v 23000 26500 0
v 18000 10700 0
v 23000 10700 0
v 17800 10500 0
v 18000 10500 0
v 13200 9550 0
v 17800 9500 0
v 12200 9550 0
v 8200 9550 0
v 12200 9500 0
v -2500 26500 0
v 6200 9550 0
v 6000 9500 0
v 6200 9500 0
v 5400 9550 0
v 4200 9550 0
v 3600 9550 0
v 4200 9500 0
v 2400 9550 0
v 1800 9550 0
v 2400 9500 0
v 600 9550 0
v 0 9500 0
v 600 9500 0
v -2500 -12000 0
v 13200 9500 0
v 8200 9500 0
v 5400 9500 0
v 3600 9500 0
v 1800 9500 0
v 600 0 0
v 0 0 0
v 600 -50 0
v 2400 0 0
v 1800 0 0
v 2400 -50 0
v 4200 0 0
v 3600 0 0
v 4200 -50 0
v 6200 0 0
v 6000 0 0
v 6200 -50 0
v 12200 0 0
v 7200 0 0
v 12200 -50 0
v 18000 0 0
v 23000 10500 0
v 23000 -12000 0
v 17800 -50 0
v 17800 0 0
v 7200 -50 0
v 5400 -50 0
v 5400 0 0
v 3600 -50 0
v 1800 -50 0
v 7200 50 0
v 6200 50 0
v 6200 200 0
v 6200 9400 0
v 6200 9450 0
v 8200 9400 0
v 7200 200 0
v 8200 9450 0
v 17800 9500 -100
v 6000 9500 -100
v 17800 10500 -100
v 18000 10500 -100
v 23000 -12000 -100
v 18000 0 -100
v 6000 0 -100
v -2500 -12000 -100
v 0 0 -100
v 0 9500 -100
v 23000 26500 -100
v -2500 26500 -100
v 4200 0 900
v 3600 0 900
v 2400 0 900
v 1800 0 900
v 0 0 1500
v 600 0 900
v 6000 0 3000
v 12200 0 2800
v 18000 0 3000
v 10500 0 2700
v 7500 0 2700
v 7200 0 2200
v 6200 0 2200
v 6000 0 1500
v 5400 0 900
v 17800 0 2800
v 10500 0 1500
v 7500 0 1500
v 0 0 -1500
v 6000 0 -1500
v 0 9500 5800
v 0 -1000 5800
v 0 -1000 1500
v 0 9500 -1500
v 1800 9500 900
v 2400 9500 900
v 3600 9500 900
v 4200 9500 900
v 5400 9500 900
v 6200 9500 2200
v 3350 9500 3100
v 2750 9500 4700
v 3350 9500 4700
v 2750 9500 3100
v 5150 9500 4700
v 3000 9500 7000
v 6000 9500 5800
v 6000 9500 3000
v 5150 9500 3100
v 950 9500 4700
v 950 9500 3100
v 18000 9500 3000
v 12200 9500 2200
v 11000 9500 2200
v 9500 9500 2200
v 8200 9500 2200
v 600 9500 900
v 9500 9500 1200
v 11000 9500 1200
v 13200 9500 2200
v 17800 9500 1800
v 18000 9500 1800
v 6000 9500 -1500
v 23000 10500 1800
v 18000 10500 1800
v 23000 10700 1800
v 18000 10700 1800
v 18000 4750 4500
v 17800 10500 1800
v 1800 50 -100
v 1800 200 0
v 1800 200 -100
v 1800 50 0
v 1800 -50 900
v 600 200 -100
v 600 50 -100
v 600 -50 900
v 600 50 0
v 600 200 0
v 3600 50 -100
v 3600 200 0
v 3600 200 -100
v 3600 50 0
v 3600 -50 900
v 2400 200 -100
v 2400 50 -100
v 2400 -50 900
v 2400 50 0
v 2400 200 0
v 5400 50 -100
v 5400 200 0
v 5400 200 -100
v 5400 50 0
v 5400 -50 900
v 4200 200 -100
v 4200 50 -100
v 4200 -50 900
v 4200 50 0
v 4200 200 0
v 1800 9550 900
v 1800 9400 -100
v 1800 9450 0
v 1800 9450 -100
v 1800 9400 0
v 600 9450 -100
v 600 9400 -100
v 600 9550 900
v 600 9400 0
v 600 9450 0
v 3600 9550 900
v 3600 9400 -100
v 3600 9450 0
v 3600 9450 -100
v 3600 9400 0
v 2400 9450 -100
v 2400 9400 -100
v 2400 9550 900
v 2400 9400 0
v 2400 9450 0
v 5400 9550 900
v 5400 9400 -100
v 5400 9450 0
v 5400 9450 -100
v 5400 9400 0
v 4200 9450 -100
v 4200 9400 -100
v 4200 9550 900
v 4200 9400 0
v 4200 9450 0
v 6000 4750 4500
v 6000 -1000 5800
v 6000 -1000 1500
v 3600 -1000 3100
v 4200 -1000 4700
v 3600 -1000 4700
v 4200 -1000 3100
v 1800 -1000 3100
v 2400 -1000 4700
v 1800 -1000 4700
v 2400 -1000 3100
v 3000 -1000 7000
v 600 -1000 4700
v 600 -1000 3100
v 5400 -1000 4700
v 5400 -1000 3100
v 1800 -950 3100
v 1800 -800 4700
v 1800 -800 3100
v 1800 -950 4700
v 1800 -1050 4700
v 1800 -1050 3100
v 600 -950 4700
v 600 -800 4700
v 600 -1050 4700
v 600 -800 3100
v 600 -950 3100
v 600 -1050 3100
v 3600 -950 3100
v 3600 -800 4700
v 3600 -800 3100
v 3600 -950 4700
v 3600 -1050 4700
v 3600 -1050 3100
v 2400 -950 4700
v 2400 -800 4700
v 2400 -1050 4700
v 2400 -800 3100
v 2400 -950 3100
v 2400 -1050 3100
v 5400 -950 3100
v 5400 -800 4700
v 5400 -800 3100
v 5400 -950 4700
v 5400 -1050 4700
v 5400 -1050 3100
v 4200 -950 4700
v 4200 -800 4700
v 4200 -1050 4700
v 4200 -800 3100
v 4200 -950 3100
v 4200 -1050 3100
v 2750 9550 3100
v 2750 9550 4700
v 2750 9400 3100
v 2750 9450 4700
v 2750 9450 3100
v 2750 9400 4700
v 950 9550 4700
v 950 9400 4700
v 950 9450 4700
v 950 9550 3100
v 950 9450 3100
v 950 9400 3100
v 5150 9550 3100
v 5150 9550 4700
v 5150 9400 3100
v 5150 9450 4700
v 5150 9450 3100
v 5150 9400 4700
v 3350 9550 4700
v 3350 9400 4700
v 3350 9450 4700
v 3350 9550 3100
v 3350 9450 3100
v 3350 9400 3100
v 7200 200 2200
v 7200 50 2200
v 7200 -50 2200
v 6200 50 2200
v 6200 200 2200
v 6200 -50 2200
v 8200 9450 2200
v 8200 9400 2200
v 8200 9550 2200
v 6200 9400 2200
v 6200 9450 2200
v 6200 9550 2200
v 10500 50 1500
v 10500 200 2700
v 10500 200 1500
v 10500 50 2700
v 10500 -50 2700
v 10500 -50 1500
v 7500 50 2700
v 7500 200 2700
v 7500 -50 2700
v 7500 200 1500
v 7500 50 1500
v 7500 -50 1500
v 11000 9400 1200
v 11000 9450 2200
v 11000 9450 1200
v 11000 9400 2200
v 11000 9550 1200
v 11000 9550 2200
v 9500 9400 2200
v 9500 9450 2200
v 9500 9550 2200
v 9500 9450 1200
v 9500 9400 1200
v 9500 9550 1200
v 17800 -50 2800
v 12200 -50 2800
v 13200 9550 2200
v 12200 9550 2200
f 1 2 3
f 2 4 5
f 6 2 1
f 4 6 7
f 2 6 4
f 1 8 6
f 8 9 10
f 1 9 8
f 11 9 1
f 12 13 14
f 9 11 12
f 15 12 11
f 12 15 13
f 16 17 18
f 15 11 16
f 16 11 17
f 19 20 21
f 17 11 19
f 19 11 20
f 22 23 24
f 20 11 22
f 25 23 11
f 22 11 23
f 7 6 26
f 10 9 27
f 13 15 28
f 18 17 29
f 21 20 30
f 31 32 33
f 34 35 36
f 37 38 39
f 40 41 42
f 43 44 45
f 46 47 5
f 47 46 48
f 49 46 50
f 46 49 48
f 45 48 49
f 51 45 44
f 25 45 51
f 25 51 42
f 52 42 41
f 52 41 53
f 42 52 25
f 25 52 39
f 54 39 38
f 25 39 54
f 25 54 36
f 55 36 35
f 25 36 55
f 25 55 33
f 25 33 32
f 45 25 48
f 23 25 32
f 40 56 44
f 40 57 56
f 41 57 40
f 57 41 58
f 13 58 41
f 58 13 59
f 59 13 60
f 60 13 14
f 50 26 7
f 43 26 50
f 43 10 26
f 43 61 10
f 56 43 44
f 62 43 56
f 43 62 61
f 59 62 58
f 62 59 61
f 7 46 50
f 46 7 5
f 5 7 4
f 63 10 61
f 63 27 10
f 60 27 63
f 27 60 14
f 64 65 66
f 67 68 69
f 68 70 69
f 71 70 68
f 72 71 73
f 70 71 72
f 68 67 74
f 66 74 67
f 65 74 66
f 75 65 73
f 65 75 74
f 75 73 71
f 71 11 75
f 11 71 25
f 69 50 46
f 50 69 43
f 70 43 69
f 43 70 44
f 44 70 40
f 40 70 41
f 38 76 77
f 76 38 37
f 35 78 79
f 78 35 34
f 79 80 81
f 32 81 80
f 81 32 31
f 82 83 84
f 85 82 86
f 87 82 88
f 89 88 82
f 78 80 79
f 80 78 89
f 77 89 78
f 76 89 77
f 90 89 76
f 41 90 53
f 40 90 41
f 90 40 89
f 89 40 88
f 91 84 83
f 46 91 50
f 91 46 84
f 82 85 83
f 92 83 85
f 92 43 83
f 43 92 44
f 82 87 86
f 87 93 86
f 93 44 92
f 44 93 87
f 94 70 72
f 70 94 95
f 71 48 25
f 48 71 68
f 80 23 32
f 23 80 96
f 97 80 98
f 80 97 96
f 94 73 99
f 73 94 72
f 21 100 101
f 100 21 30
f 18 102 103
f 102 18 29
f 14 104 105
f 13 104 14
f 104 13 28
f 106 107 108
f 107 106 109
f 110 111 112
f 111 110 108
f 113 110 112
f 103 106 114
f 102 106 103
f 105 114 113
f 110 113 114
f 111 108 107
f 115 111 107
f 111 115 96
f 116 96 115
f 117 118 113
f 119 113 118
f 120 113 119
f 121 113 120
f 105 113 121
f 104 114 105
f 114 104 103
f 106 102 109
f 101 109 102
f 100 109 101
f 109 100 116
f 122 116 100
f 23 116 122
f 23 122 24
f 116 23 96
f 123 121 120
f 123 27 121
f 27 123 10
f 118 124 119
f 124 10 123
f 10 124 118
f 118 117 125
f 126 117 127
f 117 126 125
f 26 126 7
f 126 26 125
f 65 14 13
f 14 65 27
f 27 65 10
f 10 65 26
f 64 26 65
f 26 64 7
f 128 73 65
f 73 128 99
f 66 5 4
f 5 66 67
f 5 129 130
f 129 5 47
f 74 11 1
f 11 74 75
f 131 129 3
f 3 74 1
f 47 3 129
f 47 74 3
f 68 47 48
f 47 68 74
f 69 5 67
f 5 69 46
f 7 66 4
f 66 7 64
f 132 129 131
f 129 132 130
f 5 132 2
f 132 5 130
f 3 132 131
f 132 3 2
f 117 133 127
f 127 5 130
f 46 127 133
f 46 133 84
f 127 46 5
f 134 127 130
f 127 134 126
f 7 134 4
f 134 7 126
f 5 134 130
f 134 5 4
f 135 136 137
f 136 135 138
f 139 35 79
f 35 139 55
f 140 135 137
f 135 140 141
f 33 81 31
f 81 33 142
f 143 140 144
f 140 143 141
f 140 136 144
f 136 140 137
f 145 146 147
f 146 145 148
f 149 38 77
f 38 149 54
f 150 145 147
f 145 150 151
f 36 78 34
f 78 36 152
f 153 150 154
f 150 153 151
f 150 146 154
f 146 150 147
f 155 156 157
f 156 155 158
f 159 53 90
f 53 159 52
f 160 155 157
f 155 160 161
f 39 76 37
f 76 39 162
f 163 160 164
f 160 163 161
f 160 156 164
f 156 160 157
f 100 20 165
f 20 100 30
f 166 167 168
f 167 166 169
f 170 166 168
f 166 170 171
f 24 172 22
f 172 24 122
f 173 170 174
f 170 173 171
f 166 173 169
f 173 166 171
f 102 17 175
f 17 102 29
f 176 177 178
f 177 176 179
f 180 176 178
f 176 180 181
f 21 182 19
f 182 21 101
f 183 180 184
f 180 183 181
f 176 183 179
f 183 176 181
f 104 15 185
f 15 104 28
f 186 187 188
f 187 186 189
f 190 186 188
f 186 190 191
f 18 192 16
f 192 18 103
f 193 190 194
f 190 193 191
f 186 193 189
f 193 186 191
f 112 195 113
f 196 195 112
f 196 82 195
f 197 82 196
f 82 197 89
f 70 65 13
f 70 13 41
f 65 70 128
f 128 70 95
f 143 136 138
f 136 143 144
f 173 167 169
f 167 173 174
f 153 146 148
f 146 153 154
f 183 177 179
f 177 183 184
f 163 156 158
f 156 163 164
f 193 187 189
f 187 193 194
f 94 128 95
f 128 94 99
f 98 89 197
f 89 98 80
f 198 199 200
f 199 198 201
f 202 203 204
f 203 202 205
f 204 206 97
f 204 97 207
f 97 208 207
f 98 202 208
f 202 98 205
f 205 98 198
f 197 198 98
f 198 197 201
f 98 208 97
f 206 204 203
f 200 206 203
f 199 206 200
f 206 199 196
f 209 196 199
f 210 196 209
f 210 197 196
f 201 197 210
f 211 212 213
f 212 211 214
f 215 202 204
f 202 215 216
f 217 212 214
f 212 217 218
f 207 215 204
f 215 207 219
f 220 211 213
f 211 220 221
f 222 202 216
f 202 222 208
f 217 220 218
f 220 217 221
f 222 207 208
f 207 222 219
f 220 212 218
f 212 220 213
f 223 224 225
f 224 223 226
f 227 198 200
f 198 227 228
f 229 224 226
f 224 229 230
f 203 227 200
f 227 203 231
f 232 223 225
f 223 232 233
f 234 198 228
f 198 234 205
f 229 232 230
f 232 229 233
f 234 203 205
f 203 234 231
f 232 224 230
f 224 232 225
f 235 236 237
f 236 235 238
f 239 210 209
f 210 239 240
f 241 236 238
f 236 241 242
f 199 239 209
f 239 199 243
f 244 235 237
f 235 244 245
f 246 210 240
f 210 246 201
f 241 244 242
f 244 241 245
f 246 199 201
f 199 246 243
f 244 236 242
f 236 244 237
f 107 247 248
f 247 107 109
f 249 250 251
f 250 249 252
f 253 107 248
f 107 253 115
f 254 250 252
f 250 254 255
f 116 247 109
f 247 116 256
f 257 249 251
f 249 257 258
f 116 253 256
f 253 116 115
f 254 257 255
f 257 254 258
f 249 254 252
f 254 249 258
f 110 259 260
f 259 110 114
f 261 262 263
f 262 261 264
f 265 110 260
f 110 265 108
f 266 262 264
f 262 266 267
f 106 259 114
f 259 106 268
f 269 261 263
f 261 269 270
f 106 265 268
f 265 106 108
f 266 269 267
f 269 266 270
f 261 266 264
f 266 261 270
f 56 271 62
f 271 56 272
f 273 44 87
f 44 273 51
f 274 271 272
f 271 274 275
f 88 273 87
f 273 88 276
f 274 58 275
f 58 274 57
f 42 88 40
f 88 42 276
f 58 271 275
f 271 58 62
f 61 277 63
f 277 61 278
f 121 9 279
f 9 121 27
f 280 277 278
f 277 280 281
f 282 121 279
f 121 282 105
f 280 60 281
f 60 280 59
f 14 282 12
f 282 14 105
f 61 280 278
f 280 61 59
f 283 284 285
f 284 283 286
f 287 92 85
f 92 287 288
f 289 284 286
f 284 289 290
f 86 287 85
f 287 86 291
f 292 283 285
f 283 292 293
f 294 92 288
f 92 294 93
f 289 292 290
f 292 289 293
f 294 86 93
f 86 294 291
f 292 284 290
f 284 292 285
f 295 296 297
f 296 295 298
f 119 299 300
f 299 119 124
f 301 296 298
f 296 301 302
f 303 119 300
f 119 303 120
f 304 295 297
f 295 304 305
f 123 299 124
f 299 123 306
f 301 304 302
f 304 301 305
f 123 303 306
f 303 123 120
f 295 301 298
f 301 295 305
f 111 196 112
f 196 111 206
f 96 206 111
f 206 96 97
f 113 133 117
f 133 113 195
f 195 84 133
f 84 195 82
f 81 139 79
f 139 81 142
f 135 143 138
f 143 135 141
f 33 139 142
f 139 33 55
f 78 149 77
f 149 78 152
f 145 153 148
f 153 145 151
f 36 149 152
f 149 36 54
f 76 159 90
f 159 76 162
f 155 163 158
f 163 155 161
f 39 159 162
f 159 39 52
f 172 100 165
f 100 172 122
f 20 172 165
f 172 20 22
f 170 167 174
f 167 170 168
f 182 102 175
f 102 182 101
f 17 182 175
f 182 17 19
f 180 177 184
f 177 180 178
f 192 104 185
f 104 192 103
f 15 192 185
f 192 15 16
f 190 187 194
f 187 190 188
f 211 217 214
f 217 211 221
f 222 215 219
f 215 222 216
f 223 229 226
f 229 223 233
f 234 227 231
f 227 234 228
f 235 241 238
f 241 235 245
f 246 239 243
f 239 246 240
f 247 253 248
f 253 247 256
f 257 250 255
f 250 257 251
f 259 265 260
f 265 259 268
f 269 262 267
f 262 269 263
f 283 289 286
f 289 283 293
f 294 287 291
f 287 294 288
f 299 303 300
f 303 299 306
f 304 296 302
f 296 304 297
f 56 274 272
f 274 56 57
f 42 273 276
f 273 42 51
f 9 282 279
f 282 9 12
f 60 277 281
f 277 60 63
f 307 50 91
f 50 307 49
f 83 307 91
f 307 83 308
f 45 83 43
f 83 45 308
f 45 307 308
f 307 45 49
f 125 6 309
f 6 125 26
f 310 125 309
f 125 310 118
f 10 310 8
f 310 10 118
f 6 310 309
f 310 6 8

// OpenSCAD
// file: utilities.scad
// utilities.scad - Reusable Utility Modules
include <config.scad>

// ========================================
// BASIC UTILITY MODULES
// ========================================

module create_window_opening(x, y, z, w, d, h) {
    translate([x, y, z])
    cube([w, d, h]);
}

module create_window_pane(x, y, z, w, d, h, color_override = window_color) {
    color(color_override)
    translate([x, y, z])
    cube([w, d, h]);
}

module create_door_opening(x, y, z, w, d, h) {
    translate([x, y, z])
    cube([w, d, h]);
}

module create_door_pane(x, y, z, w, d, h, color_override = door_color) {
    color(color_override)
    translate([x, y, z])
    cube([w, d, h]);
}
// file: doors.scad
// doors.scad - Door Modules
include <config.scad>
include <utilities.scad>

// ========================================
// DOOR OPENINGS
// ========================================
module all_door_openings() {
    // Front door opening
    create_door_opening(200, -100, 0, door_width, door_depth, door_height);
    
    // Sliding door opening (back - straight across from front door)
    create_door_opening(200, house_depth - 100, 0, sliding_door_width, door_depth, door_height);
    
    // Garage door opening (front) - relative to garage section
    translate([garage_section_x, 0, 0])
    translate([200, -100, 0])
    cube([5600, 300, house_height - 200]);
    
    // Garage back door opening (against kitchen wall)
    create_door_opening(garage_section_x + 200, house_depth - 100, 0, door_width, door_depth, door_height);
}

// ========================================
// DOOR PANES
// ========================================
module all_door_panes() {
    // Front door
    create_door_pane(200, -50, 0, door_width, door_pane_depth, door_height, door_color);
    
    // Sliding door (back - glass panels)
    create_door_pane(200, house_depth - 50, 0, sliding_door_width, door_pane_depth, door_height, window_color);
    
    // Garage door (front)
    color(garage_door_color)
    translate([garage_section_x + 200, -50, 0])
    cube([5600, door_pane_depth, house_height - 200]);
    
    // Garage back door (against kitchen wall)
    create_door_pane(garage_section_x + 200, house_depth - 50, 0, door_width, door_pane_depth, door_height, door_color);
}
// file: windows.scad
// windows.scad - Window Modules
include <config.scad>
include <utilities.scad>

// ========================================
// BASEMENT WINDOWS
// ========================================
module basement_windows() {
    // Front window openings
    for (x = basement_window_x_positions) {
        create_window_opening(x, -100, -100, window_width, window_depth, basement_window_height);
    }
    // Back window openings (straight across from front)
    for (x = basement_window_x_positions) {
        create_window_opening(x, house_depth - 100, -100, window_width, window_depth, basement_window_height);
    }
}

module basement_window_panes() {
    // Front window panes
    for (x = basement_window_x_positions) {
        create_window_pane(x, -50, -100, window_width, window_pane_depth, basement_window_height, window_color);
    }
    // Back window panes (straight across from front)
    for (x = basement_window_x_positions) {
        create_window_pane(x, house_depth - 50, -100, window_width, window_pane_depth, basement_window_height, window_color);
    }
}

// ========================================
// MASTER BEDROOM WINDOWS
// ========================================
module master_bedroom_window_openings() {
    // Front windows (master bedroom)
    for (x = master_bedroom_front_window_x_positions) {
        create_window_opening(x, -1100, house_height + 100, window_width, window_depth, master_bedroom_window_height);
    }
    // Back windows (bedrooms across the hall) - wider
    for (x = master_bedroom_back_window_x_positions) {
        create_window_opening(x, house_depth - 100, house_height + 100, back_bedroom_window_width, window_depth, master_bedroom_window_height);
    }
}

module master_bedroom_window_panes() {
    // Front windows (master bedroom)
    for (x = master_bedroom_front_window_x_positions) {
        create_window_pane(x, -1050, house_height + 100, window_width, window_pane_depth, master_bedroom_window_height, window_color);
    }
    // Back windows (bedrooms across the hall) - wider
    for (x = master_bedroom_back_window_x_positions) {
        create_window_pane(x, house_depth - 50, house_height + 100, back_bedroom_window_width, window_pane_depth, master_bedroom_window_height, window_color);
    }
}

// ========================================
// GROUND FLOOR WINDOWS
// ========================================
module ground_floor_window_openings() {
    // Living room window opening (front)
    create_window_opening(1500, -100, 1500, living_room_window_width, window_depth, living_room_window_height);
    
    // Kitchen window opening (back - moved 1m east)
    create_window_opening(3500, house_depth - 100, 1200, kitchen_window_width, window_depth, kitchen_window_height);
}

module ground_floor_window_panes() {
    // Living room window (front)
    create_window_pane(1500, -50, 1500, living_room_window_width, window_pane_depth, living_room_window_height, window_color);
    
    // Kitchen window (back - moved 1m east)
    create_window_pane(3500, house_depth - 50, 1200, kitchen_window_width, window_pane_depth, kitchen_window_height, window_color);
}
// file: fence.scad
// fence.scad - Wood Fence Module
include <config.scad>

// ========================================
// FENCE MODULE
// ========================================
module wood_fence(
    main_fence_x = 18000,
    main_fence_y = 10500, 
    main_fence_width = 5000,
    connector_fence_x = 17800,
    connector_fence_y = 9500,
    connector_fence_height = 1000,
    thickness = fence_thickness,
    height = fence_height,
    color_override = fence_color
) {
    color(color_override) {
        // Main fence across back of sidewalk
        translate([main_fence_x, main_fence_y, 0])
        cube([main_fence_width, thickness, height]);
        
        // Short fence connecting to house
        translate([connector_fence_x, connector_fence_y, 0])
        cube([thickness, connector_fence_height, height]);
    }
}
// file: landscaping.scad
// landscaping.scad - Landscaping Modules
include <config.scad>

// ========================================
// LAWN AREAS
// ========================================
module lawn_areas() {
    color(grass_color) {
        // Left side lawn (in front of left section) - extended to 12m from front door
        translate([-2500, -12000, -100])
        cube([8500, 12000, 100]);
        
        // Left side of house (along the side) - extended
        translate([-2500, 0, -100])
        cube([2500, 9500, 100]);
        
        // Front of middle section lawn - extended to 12m from front door
        translate([6000, -12000, -100])
        cube([6000, 12000, 100]);
        
        // Back yard lawn (behind house) - with gap for walkway
        translate([-2500, 9500, -100])
        cube([8700, 1000, 100]); // Left side grass (before walkway)
        
        // Grass between green door and concrete walkway (fills the hole)
        translate([6200, 9500, -100])
        cube([6000, 1000, 100]);
        
        // Back yard lawn continued (after walkway) - extended to 16m from sliding door
        translate([-2500, 10500, -100])
        cube([20500, 16000, 100]); // Extended back yard to 16m depth
    }
}

// ========================================
// CONCRETE AREAS
// ========================================
module concrete_areas() {
    color(concrete_color) {
        // Driveway/garage area (in front of garage) - extended to match grass
        translate([12000, -12000, -100])
        cube([6000, 12000, 100]);
        
        // Right side concrete area (in front) - extended to match grass
        translate([18000, -12000, -100])
        cube([5000, 12000, 100]);
        
        // Right side of house (along the side)
        translate([18000, 0, -100])
        cube([5000, 9500, 100]);
        
        // 1 meter sidewalk to garage door (extends back from concrete)
        translate([18000, 9500, -100])
        cube([5000, 1000, 100]);
        
        // Walkway from gate to green door (horizontal concrete path)
        translate([12200, 9500, -100])
        cube([5600, 1000, 100]); // From green door to gate
    }
}

// ========================================
// GARDEN AREAS
// ========================================
module garden_area() {
    color(garden_dirt_color) {
        // Garden dirt on right side behind fence (from fence to back of property)
        translate([18000, 10500, -100])
        cube([5000, 16000, 100]); // Extended to match back yard depth
    }
}
// file: house_structure.scad
// house_structure.scad - Main House Structure Modules
include <config.scad>
include <windows.scad>
include <doors.scad>

// ========================================
// BASEMENT SECTION
// ========================================
module basement_section() {
    color(basement_color)
    difference() {
        translate([left_section_x, 0, -basement_height])
        cube([section_width, house_depth, basement_height]);
        
        basement_windows();
    }
}

// ========================================
// LEFT SECTION (MASTER BEDROOM)
// ========================================
module left_section_structure() {
    difference() {
        union() {
            // Ground floor - lower portion (stays in place) - living room color
            color(living_room_color)
            translate([left_section_x, 0, 0])
            cube([section_width, house_depth, house_height/2]);
            
            // Ground floor - upper portion (extends 1m forward) - master bedroom color
            color(master_bedroom_color)
            translate([left_section_x, -master_bedroom_overhang, house_height/2])
            cube([section_width, house_depth + master_bedroom_overhang, house_height/2]);
            
            // Second floor (master bedroom extends 1m forward) - master bedroom color
            color(master_bedroom_color)
            translate([left_section_x, -master_bedroom_overhang, house_height])
            cube([section_width, house_depth + master_bedroom_overhang, second_floor_height]);
        }
        
        master_bedroom_window_openings();
    }
}

// ========================================
// MIDDLE SECTION (LIVING ROOM/KITCHEN)
// ========================================
module middle_section_structure() {
    color(living_room_color)
    difference() {
        translate([middle_section_x, 0, 0])
        cube([section_width, house_depth, house_height]);
        
        // All door openings for middle section
        all_door_openings();
        
        // Ground floor window openings
        ground_floor_window_openings();
    }
}

// ========================================
// GARAGE SECTION
// ========================================
module garage_section() {
    color(garage_color)
    translate([garage_section_x, 0, 0])
    difference() {
        cube([section_width, house_depth, house_height]);
        
        // Garage door opening handled in doors.scad
        // Back door opening handled in doors.scad
    }
}

// ========================================
// ROOF SYSTEM
// ========================================
module roof_system() {
    // Left roof - front to back (peaked) for master bedroom section
    color(roof_color)
    translate([left_section_x, house_depth, house_height + second_floor_height])
    rotate([90, 0, 0])
    linear_extrude(height = house_depth + master_bedroom_overhang)
    polygon([[0, 0], [section_width, 0], [section_width/2, 1200]]);
    
    // Main roof - left to right (peaked, covers middle and garage)
    color(main_roof_color)
    translate([middle_section_x, 0, house_height])
    rotate([90, 0, 90])
    linear_extrude(height = section_width * 2)
    polygon([[0, 0], [house_depth, 0], [house_depth/2, 1500]]);
}

// ========================================
// COMPLETE HOUSE ASSEMBLY
// ========================================
module complete_house() {
    basement_section();
    left_section_structure();
    middle_section_structure();
    garage_section();
    roof_system();
    
    // All window panes
    basement_window_panes();
    master_bedroom_window_panes();
    ground_floor_window_panes();
    
    // All door panes
    all_door_panes();
}
// file: config.scad
// config.scad - Global Configuration & Constants
// ========================================
// GLOBAL SETTINGS
// ========================================
$fn = 50;

// ========================================
// HOUSE DIMENSIONS (FULL SIZE in mm)
// ========================================
house_width = 20000;  // 20 meters total
house_depth = 9500;   // 9.5 meters depth
house_height = 3000;  // Ground floor height
second_floor_height = 2800; // Second floor height
basement_height = 1500; // house_height/2

// Section widths (each 6 meters)
section_width = 6000;
left_section_x = -section_width;
middle_section_x = 0;
garage_section_x = section_width;

// Overhang configuration
master_bedroom_overhang = 1000; // 1 meter forward
overhang_start_height = house_height/2; // Upper half of ground floor + second floor

// House origin offset
house_origin_x = 6000;

// ========================================
// WINDOW DIMENSIONS
// ========================================
window_width = 1200;
window_depth = 300;
window_pane_depth = 100;
basement_window_height = 1000;
ground_floor_window_height = 1200;
master_bedroom_window_height = 1600;
back_bedroom_window_width = 1800; // Wider windows for back bedrooms
living_room_window_width = 3000;
living_room_window_height = 1200;
kitchen_window_width = 1500;
kitchen_window_height = 1000;

// Window positions (X coordinates relative to left section)
basement_window_x_positions = [-5400, -3600, -1800];
master_bedroom_front_window_x_positions = [-5400, -3600, -1800];
master_bedroom_back_window_x_positions = [-5050, -2650]; // Two bedrooms across the hall - shifted left 2 meters

// ========================================
// DOOR DIMENSIONS
// ========================================
door_width = 1000;
door_height = 2200;
door_depth = 300;
door_pane_depth = 100;
sliding_door_width = 2000; // Twice as wide as front door

// ========================================
// FENCE DIMENSIONS
// ========================================
fence_thickness = 200;  // 200mm thick
fence_height = 1800;    // 1.8m tall

// ========================================
// COLORS
// ========================================
grass_color = [0.424, 0.482, 0.188]; // 6C7B30
concrete_color = [0.643, 0.718, 0.741]; // A4B7BD
basement_color = [0.5, 0.5, 0.5];
house_color = [0.435, 0.616, 0.702]; // 6F9DB3
living_room_color = [0.545, 0.624, 0.627]; // 8B9FA0
master_bedroom_color = [0.514, 0.686, 0.737]; // 83AFBC
garage_color = [0.9, 0.9, 0.9];
garage_door_color = [0.8, 0.8, 0.773]; // CCCCC5
window_color = [0.1, 0.1, 0.1];
door_color = [0.153, 0.243, 0.243]; // 273E3E
roof_color = [0.722, 0.745, 0.745]; // B8BEBE
main_roof_color = [0.722, 0.745, 0.745]; // B8BEBE
fence_color = [0.6, 0.4, 0.2]; // Brown wood fence
garden_dirt_color = [0.4, 0.3, 0.2]; // Brown dirt for garden
// main file
// main.scad - Main Assembly File
// ========================================
// IMPORT ALL MODULES
// ========================================
include <config.scad>
include <house_structure.scad>
include <landscaping.scad>
include <fence.scad>

// ========================================
// MAIN ASSEMBLY
// ========================================

// Landscaping (rendered first, at ground level)
lawn_areas();
concrete_areas();
garden_area();

// Fence system
wood_fence();

// Main house structure (with origin offset)
translate([house_origin_x, 0, 0])
complete_house();
